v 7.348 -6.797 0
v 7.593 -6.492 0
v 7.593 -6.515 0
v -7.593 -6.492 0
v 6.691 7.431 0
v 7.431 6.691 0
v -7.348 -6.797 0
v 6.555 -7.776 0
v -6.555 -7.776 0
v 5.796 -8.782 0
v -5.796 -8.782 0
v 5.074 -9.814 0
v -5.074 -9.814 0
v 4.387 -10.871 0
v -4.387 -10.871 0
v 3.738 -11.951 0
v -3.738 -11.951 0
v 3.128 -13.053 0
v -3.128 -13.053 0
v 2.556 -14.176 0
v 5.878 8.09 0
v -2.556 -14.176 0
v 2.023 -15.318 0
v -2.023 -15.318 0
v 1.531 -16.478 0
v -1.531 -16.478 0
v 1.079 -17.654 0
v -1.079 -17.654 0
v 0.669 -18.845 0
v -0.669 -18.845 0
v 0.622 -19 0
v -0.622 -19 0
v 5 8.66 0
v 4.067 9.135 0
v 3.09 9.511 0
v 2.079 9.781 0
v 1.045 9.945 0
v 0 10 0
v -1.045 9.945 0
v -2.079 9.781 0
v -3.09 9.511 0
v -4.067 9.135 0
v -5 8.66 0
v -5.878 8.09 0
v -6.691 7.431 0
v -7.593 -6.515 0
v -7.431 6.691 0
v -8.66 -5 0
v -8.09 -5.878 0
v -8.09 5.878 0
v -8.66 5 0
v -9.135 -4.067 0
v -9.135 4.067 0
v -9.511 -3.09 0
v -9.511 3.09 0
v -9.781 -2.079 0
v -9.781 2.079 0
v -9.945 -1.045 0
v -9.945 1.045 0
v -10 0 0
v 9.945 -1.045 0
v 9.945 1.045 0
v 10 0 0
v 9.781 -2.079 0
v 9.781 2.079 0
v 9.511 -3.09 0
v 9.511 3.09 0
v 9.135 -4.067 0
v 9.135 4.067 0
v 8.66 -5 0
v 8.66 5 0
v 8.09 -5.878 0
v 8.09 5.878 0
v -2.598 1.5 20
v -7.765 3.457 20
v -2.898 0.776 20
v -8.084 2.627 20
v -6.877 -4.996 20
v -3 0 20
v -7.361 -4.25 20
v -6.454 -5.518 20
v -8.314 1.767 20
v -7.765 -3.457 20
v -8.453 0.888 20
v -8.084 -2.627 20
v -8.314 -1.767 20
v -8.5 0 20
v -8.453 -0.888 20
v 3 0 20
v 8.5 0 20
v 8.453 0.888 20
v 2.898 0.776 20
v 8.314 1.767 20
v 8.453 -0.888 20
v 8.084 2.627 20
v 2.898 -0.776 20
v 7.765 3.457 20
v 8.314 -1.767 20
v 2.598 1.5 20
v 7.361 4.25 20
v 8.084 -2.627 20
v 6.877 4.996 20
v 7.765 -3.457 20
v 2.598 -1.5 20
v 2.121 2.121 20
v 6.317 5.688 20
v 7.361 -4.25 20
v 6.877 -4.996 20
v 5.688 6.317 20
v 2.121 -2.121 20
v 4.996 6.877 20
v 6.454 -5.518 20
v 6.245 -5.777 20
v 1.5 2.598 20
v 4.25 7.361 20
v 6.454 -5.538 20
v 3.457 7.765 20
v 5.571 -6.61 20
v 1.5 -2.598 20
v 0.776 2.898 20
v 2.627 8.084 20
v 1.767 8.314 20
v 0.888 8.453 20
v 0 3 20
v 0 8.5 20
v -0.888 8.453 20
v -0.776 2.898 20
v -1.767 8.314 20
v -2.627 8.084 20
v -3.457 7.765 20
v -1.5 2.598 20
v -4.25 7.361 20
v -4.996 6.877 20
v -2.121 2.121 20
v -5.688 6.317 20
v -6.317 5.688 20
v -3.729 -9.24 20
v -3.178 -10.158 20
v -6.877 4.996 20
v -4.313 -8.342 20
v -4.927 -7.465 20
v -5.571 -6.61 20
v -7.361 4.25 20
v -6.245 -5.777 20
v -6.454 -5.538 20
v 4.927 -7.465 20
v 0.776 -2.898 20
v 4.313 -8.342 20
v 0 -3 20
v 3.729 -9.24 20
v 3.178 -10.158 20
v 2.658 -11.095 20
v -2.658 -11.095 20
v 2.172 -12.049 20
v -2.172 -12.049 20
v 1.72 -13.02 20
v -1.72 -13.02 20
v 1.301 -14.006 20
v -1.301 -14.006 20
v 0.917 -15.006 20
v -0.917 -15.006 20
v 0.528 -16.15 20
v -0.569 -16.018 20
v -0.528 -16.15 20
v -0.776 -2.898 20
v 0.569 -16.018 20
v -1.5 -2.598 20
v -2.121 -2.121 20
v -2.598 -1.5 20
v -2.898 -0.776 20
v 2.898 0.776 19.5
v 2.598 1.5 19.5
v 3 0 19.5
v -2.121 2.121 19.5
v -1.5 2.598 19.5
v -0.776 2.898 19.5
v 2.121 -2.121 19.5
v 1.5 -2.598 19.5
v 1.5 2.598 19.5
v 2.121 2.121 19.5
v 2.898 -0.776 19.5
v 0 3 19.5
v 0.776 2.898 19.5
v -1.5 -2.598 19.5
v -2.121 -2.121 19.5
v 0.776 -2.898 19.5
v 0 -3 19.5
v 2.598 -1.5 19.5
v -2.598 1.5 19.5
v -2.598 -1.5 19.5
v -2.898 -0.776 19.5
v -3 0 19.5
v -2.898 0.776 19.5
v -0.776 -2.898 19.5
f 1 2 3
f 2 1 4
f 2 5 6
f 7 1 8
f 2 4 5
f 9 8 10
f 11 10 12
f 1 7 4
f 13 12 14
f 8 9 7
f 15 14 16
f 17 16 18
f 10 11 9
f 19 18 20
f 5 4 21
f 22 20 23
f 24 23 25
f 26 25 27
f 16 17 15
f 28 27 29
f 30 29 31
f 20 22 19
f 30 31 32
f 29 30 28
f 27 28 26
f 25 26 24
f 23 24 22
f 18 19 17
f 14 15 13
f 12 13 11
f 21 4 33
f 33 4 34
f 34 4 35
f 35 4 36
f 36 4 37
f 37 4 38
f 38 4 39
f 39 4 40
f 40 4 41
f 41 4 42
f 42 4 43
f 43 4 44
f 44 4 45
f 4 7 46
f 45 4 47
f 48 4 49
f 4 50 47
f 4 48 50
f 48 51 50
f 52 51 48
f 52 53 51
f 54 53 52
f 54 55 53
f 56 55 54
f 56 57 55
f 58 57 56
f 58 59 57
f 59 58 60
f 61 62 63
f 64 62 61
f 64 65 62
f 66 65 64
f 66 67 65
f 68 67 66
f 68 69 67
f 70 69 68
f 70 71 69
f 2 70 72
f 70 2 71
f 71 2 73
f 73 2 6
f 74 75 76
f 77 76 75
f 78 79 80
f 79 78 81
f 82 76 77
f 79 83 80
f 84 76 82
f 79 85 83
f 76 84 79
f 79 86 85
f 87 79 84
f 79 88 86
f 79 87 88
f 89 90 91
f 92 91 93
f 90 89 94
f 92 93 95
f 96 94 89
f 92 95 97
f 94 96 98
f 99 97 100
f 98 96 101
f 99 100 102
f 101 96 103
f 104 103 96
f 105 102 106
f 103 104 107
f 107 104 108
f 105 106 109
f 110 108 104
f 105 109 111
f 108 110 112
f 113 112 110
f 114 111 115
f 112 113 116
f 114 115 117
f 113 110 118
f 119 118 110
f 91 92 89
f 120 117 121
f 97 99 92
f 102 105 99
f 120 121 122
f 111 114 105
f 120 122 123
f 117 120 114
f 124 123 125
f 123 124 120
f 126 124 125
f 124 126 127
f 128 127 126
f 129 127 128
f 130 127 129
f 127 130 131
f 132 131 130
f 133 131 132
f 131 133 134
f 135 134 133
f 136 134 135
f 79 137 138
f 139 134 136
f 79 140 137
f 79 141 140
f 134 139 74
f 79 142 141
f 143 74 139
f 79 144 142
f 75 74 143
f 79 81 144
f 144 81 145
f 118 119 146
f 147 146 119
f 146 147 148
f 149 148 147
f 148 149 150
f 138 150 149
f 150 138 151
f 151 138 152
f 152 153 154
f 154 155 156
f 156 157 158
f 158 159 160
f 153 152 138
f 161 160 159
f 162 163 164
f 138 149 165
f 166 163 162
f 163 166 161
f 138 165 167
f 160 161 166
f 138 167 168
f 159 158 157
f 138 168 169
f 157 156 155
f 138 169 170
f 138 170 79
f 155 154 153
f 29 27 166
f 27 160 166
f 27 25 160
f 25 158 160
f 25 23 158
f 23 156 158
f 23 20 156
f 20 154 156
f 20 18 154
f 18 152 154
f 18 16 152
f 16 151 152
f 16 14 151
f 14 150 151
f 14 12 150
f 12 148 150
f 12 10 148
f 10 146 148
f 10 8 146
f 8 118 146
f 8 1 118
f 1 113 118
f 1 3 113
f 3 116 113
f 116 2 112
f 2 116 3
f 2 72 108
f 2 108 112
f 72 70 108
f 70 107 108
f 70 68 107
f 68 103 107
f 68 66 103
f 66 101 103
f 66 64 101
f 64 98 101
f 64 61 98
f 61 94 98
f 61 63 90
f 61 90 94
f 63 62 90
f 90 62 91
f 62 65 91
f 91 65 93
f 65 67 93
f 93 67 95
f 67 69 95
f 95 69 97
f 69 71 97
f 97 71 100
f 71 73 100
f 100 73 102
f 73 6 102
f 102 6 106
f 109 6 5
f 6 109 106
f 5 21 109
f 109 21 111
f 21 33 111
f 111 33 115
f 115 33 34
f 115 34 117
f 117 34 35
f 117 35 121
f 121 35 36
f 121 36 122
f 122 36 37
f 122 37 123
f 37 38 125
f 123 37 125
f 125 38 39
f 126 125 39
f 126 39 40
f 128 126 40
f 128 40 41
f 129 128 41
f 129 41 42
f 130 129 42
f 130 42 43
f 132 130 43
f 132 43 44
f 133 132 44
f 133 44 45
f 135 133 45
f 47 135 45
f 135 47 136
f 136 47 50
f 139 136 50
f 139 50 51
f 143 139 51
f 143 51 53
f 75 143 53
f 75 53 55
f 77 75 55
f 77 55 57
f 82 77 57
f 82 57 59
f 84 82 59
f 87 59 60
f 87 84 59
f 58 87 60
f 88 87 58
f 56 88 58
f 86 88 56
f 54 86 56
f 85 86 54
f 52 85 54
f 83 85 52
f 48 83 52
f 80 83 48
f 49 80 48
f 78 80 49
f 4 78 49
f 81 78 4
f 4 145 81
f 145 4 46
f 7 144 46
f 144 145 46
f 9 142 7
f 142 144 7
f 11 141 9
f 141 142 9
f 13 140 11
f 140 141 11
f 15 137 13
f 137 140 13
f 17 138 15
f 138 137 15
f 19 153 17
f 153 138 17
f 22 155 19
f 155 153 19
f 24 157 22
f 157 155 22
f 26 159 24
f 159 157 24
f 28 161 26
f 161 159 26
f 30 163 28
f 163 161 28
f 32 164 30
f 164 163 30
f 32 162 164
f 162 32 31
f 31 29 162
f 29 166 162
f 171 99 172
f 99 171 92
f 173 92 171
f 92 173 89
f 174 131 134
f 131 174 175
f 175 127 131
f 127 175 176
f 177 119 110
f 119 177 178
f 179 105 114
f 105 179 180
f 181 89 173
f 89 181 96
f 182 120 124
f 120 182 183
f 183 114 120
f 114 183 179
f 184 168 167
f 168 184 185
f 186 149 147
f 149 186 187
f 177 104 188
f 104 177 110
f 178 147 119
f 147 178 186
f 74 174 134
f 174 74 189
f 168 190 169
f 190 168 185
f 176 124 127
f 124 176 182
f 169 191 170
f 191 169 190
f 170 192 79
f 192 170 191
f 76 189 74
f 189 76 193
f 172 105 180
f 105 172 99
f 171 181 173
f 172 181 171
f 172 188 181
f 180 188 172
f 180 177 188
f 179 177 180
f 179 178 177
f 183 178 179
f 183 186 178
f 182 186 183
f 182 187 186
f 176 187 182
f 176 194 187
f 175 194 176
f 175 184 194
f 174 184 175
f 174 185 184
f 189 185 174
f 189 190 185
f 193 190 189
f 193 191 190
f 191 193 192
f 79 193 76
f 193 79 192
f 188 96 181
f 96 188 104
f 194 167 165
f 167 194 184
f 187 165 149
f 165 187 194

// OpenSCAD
r1 = 10;
x = 35;
y = -30;
diagonal = sqrt(x*x + y*y);
r2 = diagonal - r1;
w = x*r1/diagonal;

difference() {
  color([1, 0, 0])
    linear_extrude(height=20, scale=0.85, convexity=2)
    difference() {
      union() {
        circle(r=r1, $fn=60);
        translate([0, -10])
          square([2*w, 18], center=true);
    }
    translate([x, y]) circle(r=r2, $fn=180);
    translate([-x, y]) circle(r=r2, $fn=180);
  }
  color([0, 0, 0]) translate([0, 0, 19.5])
    cylinder(r=3, h=10, $fn=24);
}
